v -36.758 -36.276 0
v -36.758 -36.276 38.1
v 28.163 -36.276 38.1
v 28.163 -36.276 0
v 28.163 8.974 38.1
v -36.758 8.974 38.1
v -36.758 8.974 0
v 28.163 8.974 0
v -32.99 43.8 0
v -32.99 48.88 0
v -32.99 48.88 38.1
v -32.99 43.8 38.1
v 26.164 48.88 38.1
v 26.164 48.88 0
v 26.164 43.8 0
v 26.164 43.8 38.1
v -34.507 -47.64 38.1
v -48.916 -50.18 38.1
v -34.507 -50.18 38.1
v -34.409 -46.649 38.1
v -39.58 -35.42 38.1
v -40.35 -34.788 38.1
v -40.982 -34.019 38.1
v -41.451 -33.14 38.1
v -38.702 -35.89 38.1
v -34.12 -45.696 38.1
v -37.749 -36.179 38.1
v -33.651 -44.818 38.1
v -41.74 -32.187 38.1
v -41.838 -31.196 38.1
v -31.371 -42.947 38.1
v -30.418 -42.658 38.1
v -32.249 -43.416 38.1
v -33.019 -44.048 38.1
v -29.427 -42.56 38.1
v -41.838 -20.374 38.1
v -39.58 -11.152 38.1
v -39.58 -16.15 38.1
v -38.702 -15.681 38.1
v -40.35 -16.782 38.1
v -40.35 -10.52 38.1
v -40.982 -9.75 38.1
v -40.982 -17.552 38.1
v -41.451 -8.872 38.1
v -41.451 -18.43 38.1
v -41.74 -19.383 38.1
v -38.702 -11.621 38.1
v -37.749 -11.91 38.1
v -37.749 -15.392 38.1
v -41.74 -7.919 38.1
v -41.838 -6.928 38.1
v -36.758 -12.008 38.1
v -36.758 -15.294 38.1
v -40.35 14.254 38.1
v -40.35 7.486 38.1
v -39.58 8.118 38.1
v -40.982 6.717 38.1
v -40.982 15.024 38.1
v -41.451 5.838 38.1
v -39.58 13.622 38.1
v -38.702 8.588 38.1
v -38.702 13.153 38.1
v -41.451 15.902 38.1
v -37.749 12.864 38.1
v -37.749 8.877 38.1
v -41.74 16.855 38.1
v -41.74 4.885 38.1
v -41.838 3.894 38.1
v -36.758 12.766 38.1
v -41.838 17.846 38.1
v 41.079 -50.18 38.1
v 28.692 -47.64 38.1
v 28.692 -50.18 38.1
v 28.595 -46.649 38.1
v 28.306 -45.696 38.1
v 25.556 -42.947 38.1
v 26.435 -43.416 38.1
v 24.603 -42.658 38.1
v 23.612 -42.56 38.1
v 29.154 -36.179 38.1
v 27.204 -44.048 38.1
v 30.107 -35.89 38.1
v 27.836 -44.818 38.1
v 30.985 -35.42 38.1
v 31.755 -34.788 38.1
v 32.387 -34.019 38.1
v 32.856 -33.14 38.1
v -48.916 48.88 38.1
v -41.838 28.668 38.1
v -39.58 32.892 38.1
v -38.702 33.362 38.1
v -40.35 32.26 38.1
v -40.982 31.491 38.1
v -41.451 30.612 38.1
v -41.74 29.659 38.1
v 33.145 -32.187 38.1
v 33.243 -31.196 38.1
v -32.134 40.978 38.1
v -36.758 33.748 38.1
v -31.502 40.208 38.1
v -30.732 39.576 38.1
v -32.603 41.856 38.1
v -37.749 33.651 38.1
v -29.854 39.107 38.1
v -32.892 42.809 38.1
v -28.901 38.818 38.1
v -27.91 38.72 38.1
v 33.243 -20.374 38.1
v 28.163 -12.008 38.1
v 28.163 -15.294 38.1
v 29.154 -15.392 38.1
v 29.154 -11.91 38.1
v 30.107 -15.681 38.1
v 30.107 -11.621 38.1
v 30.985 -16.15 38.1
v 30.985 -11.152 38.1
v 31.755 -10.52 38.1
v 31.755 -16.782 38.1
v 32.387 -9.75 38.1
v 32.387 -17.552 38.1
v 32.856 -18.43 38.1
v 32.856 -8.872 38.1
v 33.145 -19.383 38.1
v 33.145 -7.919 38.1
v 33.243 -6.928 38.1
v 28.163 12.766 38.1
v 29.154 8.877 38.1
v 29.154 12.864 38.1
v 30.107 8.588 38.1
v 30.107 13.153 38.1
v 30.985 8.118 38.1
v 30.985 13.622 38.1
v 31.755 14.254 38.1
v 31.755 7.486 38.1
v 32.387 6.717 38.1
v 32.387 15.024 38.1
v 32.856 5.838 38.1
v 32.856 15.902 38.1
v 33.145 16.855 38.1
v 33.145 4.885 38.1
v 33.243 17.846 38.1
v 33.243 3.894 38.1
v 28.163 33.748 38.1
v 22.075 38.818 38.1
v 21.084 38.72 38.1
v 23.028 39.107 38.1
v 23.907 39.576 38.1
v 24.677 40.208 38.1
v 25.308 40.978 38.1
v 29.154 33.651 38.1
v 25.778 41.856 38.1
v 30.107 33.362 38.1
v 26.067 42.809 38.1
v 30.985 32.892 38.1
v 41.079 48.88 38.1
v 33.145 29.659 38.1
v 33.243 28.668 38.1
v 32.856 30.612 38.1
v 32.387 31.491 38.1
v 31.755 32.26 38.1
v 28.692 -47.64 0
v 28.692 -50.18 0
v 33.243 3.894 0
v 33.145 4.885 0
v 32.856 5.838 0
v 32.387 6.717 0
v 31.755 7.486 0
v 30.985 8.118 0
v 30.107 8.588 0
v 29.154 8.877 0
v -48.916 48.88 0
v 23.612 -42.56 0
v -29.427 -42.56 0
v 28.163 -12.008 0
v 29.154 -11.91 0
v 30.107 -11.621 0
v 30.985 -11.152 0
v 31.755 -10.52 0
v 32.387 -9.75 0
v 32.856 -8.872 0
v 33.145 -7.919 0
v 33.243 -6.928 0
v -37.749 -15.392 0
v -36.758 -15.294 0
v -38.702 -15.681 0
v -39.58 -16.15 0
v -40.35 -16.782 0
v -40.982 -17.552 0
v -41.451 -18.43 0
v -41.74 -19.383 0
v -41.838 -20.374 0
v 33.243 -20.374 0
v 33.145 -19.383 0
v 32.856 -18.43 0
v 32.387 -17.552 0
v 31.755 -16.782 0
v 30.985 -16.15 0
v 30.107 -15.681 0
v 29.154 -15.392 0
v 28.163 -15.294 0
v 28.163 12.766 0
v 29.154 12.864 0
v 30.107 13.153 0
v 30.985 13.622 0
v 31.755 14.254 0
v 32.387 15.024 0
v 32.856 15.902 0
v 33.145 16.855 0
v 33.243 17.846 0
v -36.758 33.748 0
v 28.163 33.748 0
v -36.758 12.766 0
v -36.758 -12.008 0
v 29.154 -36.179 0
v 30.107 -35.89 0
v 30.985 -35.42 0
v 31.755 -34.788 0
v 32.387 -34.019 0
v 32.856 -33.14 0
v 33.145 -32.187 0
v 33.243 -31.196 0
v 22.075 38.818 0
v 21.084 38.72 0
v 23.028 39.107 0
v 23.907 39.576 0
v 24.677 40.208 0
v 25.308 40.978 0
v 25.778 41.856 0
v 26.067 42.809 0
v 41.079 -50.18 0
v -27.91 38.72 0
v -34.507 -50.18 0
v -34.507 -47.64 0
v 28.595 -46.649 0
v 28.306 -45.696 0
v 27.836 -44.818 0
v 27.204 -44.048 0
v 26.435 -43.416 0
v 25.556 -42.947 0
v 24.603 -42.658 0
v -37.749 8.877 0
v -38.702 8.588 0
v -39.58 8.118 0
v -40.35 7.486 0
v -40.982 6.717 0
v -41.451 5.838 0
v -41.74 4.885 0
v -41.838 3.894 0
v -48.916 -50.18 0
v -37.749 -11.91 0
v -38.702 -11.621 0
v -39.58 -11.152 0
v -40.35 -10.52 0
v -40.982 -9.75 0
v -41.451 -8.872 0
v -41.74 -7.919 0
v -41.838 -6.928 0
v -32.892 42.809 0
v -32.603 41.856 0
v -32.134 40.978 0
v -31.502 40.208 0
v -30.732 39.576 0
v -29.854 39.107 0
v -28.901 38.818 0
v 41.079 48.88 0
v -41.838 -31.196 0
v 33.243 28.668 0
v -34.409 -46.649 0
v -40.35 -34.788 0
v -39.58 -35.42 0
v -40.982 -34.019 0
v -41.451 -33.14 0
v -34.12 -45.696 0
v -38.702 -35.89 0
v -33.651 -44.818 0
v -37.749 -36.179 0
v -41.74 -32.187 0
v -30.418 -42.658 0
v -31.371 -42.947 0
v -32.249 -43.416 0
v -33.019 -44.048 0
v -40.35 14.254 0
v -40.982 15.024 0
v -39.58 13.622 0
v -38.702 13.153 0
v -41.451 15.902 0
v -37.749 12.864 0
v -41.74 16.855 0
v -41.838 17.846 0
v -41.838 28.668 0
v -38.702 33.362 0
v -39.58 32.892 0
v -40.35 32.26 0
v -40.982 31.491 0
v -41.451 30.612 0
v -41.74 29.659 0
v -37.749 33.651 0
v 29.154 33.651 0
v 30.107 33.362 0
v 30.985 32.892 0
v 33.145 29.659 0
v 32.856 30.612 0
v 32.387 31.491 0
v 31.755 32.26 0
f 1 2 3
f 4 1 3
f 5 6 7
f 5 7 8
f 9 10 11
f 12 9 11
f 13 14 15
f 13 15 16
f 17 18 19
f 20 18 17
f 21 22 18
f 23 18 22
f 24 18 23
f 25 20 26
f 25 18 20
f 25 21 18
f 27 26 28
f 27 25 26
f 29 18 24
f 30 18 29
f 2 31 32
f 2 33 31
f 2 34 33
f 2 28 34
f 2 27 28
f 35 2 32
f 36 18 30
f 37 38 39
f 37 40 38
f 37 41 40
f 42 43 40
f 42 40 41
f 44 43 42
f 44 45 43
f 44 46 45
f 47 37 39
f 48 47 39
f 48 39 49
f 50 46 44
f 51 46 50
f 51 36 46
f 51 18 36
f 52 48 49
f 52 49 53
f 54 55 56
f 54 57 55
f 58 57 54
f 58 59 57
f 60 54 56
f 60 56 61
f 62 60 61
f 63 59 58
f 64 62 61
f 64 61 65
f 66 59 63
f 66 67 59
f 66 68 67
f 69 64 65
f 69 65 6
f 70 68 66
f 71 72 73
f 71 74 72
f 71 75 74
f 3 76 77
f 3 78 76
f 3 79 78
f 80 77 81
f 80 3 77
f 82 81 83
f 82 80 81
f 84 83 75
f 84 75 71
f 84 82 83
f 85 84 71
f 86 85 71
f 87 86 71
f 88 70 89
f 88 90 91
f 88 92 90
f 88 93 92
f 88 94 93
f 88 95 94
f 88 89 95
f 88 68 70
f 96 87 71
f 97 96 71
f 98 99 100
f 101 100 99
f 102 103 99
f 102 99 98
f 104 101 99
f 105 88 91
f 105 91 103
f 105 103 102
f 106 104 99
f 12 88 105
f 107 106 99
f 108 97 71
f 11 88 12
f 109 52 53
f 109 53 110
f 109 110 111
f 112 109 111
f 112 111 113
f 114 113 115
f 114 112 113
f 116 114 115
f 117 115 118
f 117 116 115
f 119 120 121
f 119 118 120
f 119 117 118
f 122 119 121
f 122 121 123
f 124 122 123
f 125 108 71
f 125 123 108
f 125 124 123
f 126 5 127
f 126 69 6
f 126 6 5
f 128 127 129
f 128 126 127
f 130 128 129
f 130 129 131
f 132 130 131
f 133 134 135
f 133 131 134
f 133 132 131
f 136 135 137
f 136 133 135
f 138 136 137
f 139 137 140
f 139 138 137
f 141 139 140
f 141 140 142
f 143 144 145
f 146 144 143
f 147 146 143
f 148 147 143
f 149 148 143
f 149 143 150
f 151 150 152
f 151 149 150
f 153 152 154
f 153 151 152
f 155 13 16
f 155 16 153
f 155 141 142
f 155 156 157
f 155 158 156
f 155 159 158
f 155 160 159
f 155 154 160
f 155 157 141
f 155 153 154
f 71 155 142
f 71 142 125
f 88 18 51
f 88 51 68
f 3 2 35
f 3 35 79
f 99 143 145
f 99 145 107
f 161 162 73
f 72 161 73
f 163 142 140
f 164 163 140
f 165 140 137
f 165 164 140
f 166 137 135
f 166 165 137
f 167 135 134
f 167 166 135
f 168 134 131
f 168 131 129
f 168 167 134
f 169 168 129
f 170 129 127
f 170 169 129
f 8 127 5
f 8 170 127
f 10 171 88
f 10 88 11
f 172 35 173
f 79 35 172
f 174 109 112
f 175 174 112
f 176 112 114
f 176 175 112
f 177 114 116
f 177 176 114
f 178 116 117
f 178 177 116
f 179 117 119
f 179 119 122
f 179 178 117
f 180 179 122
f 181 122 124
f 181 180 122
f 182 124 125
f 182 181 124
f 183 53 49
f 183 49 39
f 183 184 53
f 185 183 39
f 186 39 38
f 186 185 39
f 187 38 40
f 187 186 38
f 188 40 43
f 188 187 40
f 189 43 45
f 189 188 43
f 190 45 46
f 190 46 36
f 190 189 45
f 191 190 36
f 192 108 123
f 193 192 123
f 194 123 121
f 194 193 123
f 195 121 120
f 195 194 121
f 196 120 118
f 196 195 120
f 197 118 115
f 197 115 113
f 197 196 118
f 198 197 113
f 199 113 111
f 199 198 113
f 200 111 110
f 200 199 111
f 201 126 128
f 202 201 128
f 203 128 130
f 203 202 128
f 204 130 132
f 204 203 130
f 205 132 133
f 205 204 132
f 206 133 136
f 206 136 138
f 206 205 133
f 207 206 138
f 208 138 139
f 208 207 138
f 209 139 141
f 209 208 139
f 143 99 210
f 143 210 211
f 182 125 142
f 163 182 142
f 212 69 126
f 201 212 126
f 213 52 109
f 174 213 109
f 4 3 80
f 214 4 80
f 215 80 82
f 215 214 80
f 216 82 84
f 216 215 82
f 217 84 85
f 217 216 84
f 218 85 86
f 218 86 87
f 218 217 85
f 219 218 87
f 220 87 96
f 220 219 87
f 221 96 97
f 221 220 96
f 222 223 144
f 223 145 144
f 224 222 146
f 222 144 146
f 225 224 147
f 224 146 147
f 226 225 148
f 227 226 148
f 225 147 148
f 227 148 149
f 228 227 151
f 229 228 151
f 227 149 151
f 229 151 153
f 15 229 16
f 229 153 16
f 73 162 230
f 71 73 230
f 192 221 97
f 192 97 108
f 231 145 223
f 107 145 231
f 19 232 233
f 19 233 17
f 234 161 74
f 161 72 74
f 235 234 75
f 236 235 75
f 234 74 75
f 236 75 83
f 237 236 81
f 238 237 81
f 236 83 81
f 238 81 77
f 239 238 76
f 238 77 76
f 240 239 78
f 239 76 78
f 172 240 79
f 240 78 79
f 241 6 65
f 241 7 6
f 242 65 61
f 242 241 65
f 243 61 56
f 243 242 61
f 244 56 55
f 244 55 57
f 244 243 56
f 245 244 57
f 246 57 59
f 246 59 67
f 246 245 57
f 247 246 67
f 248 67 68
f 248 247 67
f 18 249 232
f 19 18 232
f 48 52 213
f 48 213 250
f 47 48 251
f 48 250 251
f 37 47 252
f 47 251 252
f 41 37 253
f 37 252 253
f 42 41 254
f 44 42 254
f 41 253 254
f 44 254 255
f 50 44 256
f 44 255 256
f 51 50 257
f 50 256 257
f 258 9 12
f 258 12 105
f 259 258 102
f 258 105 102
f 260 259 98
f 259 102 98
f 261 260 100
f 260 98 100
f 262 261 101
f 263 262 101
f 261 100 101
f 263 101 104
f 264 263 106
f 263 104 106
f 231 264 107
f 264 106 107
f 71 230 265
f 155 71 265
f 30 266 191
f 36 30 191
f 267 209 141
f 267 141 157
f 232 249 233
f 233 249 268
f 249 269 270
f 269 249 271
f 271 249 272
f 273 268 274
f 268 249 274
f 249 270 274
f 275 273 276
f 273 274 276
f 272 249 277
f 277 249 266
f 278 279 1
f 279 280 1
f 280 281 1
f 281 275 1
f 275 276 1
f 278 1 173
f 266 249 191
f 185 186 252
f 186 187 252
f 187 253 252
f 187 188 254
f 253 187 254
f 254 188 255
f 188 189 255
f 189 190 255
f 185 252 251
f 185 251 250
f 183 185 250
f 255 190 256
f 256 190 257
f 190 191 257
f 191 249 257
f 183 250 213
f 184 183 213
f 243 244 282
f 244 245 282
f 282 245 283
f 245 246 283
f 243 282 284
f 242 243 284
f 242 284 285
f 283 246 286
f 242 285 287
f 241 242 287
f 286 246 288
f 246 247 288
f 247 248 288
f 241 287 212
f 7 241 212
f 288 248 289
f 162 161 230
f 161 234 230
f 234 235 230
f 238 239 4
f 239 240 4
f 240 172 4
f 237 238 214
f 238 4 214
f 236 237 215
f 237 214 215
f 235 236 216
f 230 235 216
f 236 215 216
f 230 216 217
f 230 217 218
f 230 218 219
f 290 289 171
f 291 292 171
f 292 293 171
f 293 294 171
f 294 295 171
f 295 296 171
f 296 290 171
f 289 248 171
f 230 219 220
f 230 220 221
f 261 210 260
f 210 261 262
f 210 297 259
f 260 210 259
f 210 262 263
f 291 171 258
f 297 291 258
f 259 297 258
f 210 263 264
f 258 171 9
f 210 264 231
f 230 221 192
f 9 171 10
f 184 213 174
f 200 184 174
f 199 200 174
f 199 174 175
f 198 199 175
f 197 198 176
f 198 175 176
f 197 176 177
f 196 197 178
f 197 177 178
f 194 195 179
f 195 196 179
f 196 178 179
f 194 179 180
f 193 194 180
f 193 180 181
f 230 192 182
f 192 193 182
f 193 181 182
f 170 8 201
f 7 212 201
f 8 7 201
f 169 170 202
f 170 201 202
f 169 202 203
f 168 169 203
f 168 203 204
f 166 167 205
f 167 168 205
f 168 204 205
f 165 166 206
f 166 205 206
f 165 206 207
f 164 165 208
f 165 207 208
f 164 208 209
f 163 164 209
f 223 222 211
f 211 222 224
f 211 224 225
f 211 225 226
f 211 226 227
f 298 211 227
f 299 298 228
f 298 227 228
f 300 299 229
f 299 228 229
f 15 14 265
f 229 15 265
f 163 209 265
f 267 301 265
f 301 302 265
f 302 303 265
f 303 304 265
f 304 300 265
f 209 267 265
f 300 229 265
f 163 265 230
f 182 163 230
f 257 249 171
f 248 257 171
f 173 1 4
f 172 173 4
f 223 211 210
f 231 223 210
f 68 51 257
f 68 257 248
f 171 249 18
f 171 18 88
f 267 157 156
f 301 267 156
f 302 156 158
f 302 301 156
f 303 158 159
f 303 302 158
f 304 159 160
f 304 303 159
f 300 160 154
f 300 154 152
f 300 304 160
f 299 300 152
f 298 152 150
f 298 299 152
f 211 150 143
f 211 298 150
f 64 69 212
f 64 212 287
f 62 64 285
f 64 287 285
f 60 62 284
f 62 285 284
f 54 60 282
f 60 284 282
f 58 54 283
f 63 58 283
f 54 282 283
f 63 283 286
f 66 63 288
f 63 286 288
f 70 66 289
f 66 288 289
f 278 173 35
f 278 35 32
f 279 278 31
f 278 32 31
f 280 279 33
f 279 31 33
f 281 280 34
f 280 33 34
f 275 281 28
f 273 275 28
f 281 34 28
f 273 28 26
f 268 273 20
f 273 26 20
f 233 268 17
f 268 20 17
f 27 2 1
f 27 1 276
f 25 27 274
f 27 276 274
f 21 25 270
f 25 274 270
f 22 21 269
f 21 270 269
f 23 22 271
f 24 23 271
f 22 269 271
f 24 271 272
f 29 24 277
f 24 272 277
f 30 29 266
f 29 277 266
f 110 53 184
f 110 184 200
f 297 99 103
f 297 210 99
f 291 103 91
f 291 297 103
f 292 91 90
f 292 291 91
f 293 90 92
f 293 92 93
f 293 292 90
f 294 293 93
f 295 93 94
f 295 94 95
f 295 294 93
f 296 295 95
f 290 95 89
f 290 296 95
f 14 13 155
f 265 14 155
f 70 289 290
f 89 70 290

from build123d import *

# Parameters (mm, degrees)
F0_W     = 89.995448
F0_H     = 99.06
F1_DEPTH = 38.1
F2_W     = 75.08048
F2_H     = 20.982087
F2_H_2   = 20.982086
F3_DEPTH = 38.1
F4_R     = 5.08
F5_W     = 59.154313
F5_H     = 38.1
F6_DEPTH = 10.16
F7_R     = 5.08
F8_W     = 63.199052
F8_H     = 38.1
F9_DEPTH = 7.62
F10_R    = 5.08


with BuildPart() as f1:
    # F0 (on Top) → F1 (new body)
    with BuildSketch(Plane.XY):
        with Locations((-3.918344, -0.650048)):
            Rectangle(F0_W, F0_H)
    extrude(amount=F1_DEPTH)

    # F2 (on face) → F3 (cut)
    with BuildSketch(Plane.XY.offset(38.1)):
        with Locations((-4.297534, 23.257251)):
            Rectangle(F2_W, F2_H)
        with Locations((-4.297534, -1.516776)):
            Rectangle(F2_W, F2_H_2)
        with Locations((-4.297534, -25.785215)):
            Rectangle(F2_W, F2_H)
    extrude(amount=-F3_DEPTH, mode=Mode.SUBTRACT)

    # F4
    f4_edges = [f1.edges().sort_by_distance(p)[0] for p in [
        (33.242706, 33.748295, 19.05),
        (33.242706, 8.974267, 19.05),
        (33.242706, -15.294172, 19.05),
        (-41.837774, 33.748295, 19.05),
        (-41.837774, 8.974267, 19.05),
        (-41.837774, -15.294172, 19.05),
        (-41.837774, -36.276259, 19.05),
        (-41.837774, -12.007819, 19.05),
        (-41.837774, 12.766208, 19.05),
        (33.242706, -36.276259, 19.05),
        (33.242706, -12.007819, 19.05),
        (33.242706, 12.766208, 19.05),
    ]]
    fillet(f4_edges, radius=F4_R)

    # F5 (on face) → F6 (cut)
    with BuildSketch(Plane(origin=(0, 48.879952, 0), x_dir=(-1, 0, 0), z_dir=(0, 1, 0))):
        with Locations((3.412747, 19.05)):
            Rectangle(F5_W, F5_H)
    extrude(amount=-F6_DEPTH, mode=Mode.SUBTRACT)

    # F7
    f7_edges = [f1.edges().sort_by_distance(p)[0] for p in [
        (-32.989904, 38.719952, 19.05),
        (26.164409, 38.719952, 19.05),
    ]]
    fillet(f7_edges, radius=F7_R)

    # F8 (on face) → F9 (cut)
    with BuildSketch(Plane.XZ.offset(50.180048)):
        with Locations((-2.907156, 19.05)):
            Rectangle(F8_W, F8_H)
    extrude(amount=-F9_DEPTH, mode=Mode.SUBTRACT)

    # F10
    f10_edges = [f1.edges().sort_by_distance(p)[0] for p in [
        (28.69237, -42.560048, 19.05),
        (-34.506682, -42.560048, 19.05),
    ]]
    fillet(f10_edges, radius=F10_R)


solid = f1.part
